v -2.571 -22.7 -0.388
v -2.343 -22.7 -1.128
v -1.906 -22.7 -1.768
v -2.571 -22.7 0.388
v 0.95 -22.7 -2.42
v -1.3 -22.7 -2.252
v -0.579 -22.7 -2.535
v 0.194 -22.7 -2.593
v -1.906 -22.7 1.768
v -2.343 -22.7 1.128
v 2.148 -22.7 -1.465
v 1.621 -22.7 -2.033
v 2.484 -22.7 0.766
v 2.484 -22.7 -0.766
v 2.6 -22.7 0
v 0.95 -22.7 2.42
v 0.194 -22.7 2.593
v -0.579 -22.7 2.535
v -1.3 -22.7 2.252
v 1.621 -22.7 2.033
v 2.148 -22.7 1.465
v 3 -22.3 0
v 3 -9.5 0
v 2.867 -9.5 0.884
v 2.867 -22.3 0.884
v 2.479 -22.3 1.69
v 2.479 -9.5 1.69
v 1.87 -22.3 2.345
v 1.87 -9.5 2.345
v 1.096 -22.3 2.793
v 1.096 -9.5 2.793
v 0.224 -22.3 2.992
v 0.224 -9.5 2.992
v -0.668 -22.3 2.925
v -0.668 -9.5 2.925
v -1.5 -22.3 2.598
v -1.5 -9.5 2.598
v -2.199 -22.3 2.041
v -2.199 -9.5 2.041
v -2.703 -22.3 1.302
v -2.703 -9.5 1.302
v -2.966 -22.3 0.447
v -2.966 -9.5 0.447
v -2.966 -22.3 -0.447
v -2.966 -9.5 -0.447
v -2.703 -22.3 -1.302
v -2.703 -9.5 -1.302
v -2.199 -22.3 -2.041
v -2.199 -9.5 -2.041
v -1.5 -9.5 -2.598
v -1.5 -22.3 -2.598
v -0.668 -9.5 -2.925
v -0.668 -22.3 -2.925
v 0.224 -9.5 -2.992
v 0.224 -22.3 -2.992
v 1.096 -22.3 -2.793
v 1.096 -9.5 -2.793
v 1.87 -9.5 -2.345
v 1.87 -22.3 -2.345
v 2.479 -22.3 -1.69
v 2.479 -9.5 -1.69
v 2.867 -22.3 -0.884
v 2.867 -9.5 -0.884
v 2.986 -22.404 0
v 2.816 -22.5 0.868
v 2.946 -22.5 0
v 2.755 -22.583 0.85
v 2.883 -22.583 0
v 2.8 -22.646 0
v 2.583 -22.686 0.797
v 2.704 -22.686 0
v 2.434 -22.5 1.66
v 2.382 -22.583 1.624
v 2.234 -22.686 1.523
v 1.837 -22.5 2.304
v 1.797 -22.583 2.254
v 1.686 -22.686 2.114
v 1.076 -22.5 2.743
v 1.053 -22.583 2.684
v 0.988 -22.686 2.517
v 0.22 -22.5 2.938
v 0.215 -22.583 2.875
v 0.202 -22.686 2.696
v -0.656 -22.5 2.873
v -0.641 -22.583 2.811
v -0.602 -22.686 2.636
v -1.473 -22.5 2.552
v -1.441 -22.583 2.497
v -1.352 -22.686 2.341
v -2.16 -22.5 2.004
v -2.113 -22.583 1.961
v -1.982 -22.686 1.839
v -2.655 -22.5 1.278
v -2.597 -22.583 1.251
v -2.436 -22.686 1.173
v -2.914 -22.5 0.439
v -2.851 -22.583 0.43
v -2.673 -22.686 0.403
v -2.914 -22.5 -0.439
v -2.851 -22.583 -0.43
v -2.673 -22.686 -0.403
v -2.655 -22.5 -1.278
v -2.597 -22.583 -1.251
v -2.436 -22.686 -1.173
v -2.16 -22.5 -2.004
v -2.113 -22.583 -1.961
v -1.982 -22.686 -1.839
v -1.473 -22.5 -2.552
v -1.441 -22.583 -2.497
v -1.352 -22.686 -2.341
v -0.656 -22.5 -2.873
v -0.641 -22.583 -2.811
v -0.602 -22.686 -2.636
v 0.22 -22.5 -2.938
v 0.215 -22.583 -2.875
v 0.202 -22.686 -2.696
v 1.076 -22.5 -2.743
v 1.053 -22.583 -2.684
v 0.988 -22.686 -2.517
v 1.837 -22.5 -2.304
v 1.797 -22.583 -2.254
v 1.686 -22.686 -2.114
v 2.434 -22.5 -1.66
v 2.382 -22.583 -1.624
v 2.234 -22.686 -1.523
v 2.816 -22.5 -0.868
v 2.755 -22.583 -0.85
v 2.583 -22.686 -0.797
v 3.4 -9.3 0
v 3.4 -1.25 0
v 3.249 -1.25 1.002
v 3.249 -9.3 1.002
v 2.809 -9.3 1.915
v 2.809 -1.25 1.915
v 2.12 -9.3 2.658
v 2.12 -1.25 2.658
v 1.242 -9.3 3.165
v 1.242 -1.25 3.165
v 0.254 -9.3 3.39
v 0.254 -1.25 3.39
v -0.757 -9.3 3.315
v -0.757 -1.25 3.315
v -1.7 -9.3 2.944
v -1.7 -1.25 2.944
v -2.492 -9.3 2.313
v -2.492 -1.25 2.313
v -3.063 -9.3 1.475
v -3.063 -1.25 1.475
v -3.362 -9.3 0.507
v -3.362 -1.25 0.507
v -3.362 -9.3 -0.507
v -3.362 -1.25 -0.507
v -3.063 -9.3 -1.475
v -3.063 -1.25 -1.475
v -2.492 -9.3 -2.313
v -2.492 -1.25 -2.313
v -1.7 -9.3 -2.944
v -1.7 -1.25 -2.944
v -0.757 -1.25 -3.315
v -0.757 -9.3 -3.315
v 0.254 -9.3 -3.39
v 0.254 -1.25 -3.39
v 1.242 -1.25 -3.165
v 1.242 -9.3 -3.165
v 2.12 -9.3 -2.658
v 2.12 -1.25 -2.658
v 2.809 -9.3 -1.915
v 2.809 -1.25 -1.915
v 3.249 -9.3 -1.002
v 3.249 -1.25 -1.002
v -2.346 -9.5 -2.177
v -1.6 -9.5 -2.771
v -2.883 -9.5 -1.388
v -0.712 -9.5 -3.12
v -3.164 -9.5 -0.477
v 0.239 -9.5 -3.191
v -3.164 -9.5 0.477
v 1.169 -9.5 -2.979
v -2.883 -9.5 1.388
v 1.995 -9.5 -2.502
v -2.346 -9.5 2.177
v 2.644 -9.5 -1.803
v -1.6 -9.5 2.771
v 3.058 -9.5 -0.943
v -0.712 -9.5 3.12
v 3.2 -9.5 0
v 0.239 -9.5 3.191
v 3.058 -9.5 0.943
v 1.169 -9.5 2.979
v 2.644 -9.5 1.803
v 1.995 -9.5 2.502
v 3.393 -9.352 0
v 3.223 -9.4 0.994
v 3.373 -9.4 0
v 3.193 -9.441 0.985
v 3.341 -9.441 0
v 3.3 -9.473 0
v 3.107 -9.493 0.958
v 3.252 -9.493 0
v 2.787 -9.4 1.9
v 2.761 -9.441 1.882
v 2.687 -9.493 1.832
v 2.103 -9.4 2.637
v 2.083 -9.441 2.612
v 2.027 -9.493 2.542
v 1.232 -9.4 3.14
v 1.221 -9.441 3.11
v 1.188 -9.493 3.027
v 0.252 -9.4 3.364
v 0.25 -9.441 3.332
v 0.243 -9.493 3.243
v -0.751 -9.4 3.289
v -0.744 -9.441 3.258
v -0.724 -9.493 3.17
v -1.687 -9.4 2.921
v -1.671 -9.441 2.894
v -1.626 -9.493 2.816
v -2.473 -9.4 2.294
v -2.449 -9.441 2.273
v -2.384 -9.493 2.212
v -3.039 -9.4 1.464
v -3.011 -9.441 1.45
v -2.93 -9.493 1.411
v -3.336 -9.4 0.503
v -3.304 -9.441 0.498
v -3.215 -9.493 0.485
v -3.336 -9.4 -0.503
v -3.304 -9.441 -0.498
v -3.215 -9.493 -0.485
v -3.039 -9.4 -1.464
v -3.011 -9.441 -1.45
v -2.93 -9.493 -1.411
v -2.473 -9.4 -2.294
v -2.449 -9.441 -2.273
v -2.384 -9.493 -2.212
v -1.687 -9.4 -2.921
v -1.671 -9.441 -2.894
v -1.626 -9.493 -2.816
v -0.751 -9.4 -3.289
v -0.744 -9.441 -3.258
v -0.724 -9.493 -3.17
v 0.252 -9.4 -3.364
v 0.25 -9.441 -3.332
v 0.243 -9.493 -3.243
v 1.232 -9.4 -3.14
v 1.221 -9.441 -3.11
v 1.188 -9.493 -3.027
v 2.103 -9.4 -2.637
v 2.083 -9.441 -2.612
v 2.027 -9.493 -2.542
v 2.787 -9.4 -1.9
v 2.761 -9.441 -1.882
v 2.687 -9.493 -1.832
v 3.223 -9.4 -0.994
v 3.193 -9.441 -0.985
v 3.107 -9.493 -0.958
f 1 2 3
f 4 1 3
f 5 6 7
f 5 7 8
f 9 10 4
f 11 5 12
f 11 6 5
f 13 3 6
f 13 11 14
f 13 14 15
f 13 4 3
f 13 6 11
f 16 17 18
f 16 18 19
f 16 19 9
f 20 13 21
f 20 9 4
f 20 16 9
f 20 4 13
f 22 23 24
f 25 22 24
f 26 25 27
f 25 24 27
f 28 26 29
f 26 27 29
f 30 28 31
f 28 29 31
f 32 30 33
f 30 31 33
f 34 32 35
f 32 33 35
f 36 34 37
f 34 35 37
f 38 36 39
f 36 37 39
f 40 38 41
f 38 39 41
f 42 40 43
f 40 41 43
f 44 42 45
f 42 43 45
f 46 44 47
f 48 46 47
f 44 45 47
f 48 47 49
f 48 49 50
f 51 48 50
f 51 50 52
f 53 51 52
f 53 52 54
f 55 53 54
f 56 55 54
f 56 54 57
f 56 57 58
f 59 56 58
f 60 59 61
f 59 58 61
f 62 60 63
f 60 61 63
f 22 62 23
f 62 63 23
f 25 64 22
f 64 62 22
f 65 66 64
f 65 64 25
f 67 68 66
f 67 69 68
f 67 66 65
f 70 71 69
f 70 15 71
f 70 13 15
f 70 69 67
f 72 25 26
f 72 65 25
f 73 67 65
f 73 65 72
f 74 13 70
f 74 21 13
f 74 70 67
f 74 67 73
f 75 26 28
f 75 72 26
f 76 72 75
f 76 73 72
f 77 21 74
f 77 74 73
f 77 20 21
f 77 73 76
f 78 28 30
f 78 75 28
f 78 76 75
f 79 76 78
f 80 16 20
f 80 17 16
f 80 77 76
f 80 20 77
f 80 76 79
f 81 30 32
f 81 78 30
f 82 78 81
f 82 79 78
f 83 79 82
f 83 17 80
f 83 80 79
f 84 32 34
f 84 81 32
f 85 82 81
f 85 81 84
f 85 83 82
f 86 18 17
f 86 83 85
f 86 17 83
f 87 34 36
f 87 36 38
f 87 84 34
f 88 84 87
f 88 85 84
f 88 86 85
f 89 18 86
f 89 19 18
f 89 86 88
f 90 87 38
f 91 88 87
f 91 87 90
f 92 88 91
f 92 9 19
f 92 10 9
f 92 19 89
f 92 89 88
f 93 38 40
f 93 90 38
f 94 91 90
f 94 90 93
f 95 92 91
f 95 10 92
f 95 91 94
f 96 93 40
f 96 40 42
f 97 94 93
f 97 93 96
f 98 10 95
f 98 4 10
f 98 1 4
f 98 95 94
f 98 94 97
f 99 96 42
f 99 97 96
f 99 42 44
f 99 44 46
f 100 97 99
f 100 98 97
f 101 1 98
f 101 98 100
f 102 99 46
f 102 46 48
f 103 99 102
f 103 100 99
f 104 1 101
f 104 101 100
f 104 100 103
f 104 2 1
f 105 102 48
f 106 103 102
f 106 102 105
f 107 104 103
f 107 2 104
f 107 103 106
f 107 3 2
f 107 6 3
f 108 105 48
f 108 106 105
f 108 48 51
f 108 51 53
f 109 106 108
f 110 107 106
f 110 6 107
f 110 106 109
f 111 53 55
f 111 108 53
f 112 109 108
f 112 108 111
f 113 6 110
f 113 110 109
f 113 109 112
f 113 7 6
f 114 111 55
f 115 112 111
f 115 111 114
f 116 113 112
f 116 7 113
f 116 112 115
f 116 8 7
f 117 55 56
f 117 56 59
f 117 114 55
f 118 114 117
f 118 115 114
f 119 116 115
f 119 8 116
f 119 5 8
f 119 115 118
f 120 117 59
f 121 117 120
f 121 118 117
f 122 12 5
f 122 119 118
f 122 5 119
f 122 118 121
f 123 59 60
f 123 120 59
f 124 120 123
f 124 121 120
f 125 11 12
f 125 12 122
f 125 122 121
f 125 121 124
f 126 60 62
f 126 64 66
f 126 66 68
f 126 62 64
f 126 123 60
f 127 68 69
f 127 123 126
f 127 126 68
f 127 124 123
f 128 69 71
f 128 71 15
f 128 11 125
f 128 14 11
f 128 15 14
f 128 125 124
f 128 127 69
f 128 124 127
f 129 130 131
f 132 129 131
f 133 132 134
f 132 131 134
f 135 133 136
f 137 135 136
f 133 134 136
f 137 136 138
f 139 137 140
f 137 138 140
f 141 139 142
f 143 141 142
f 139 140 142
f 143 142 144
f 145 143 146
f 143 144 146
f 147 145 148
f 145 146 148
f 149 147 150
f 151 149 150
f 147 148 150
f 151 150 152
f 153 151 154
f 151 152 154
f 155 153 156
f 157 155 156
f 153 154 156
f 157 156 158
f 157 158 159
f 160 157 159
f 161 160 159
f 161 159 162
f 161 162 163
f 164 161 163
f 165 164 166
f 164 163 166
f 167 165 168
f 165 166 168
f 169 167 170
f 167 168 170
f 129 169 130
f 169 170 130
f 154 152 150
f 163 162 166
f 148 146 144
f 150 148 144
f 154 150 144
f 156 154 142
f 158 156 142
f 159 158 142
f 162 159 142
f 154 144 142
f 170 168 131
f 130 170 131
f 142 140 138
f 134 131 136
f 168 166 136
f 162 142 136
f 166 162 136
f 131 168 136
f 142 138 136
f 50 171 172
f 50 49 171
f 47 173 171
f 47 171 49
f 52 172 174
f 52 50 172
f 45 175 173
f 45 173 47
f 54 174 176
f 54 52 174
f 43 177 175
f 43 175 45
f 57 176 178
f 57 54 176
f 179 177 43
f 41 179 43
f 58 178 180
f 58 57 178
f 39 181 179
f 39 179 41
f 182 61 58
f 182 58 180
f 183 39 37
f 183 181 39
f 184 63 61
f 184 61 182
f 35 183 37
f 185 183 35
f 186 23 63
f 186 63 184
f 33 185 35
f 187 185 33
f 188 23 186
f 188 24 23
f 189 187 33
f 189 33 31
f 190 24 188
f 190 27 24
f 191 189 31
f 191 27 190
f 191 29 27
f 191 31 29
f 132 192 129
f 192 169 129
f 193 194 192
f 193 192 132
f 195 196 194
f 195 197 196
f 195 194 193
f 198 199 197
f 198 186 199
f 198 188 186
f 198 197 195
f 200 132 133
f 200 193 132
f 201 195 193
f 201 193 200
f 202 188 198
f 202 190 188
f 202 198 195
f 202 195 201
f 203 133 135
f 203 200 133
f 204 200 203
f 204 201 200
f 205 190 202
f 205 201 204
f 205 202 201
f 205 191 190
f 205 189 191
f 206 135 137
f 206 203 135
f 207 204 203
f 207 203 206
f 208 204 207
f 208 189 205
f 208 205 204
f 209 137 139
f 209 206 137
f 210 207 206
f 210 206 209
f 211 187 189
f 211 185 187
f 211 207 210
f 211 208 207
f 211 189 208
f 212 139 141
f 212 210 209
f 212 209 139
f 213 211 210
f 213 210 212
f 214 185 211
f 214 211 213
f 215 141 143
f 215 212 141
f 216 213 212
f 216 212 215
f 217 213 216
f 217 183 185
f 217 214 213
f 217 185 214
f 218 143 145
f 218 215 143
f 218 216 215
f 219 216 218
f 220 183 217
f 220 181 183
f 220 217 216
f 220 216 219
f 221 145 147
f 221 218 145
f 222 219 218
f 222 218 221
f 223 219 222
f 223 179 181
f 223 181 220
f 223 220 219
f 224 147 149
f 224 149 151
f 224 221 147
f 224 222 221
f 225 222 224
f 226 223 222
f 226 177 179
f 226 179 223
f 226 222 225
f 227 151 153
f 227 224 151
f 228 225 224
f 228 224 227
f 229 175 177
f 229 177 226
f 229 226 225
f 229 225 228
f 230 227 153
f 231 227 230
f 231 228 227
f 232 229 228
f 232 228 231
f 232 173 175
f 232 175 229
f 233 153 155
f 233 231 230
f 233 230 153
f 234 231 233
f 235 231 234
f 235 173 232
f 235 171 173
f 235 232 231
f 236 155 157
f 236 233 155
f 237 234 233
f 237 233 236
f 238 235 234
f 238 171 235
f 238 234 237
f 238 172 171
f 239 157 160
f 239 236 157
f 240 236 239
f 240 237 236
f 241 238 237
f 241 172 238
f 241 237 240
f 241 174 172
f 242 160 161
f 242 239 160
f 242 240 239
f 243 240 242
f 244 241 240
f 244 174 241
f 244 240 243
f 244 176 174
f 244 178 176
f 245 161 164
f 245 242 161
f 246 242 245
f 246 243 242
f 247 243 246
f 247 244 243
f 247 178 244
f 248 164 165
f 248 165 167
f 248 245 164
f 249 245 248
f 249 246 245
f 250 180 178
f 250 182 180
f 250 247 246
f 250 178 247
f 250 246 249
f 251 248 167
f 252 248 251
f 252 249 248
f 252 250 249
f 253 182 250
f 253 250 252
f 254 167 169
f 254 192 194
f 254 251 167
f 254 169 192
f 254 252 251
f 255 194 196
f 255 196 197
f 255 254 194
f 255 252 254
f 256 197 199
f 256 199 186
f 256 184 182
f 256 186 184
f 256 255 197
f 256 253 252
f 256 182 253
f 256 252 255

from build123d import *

# Parameters (mm, degrees)
SKETCH011_R  = 3.4
PAD009_DEPTH = 8.25
FILLET004_R  = 0.2
SKETCH012_R  = 3
PAD010_DEPTH = 13.2
FILLET005_R  = 0.4


with BuildPart() as part:
    # Sketch011 → Pad009 (new body)
    with BuildSketch(Plane.XZ):
        Circle(SKETCH011_R)
    extrude(amount=PAD009_DEPTH)

    # Fillet004
    fillet004_edges = [part.edges().sort_by_distance(p)[0] for p in [
        (-3.4, -8.25, 0),
    ]]
    fillet(fillet004_edges, radius=FILLET004_R)

    # Sketch012 (on Face4 of Fillet004) → Pad010 (join)
    with BuildSketch(Plane.XZ.offset(8.25)):
        Circle(SKETCH012_R)
    extrude(amount=PAD010_DEPTH)

    # Fillet005
    fillet005_edges = [part.edges().sort_by_distance(p)[0] for p in [
        (-3, -21.45, 0),
    ]]
    fillet(fillet005_edges, radius=FILLET005_R)


with BuildPart() as part_1:
    # Body019 placement: moved
    add(part.part.moved(Location((0, -1.25, 0))))


solid = part_1.part
